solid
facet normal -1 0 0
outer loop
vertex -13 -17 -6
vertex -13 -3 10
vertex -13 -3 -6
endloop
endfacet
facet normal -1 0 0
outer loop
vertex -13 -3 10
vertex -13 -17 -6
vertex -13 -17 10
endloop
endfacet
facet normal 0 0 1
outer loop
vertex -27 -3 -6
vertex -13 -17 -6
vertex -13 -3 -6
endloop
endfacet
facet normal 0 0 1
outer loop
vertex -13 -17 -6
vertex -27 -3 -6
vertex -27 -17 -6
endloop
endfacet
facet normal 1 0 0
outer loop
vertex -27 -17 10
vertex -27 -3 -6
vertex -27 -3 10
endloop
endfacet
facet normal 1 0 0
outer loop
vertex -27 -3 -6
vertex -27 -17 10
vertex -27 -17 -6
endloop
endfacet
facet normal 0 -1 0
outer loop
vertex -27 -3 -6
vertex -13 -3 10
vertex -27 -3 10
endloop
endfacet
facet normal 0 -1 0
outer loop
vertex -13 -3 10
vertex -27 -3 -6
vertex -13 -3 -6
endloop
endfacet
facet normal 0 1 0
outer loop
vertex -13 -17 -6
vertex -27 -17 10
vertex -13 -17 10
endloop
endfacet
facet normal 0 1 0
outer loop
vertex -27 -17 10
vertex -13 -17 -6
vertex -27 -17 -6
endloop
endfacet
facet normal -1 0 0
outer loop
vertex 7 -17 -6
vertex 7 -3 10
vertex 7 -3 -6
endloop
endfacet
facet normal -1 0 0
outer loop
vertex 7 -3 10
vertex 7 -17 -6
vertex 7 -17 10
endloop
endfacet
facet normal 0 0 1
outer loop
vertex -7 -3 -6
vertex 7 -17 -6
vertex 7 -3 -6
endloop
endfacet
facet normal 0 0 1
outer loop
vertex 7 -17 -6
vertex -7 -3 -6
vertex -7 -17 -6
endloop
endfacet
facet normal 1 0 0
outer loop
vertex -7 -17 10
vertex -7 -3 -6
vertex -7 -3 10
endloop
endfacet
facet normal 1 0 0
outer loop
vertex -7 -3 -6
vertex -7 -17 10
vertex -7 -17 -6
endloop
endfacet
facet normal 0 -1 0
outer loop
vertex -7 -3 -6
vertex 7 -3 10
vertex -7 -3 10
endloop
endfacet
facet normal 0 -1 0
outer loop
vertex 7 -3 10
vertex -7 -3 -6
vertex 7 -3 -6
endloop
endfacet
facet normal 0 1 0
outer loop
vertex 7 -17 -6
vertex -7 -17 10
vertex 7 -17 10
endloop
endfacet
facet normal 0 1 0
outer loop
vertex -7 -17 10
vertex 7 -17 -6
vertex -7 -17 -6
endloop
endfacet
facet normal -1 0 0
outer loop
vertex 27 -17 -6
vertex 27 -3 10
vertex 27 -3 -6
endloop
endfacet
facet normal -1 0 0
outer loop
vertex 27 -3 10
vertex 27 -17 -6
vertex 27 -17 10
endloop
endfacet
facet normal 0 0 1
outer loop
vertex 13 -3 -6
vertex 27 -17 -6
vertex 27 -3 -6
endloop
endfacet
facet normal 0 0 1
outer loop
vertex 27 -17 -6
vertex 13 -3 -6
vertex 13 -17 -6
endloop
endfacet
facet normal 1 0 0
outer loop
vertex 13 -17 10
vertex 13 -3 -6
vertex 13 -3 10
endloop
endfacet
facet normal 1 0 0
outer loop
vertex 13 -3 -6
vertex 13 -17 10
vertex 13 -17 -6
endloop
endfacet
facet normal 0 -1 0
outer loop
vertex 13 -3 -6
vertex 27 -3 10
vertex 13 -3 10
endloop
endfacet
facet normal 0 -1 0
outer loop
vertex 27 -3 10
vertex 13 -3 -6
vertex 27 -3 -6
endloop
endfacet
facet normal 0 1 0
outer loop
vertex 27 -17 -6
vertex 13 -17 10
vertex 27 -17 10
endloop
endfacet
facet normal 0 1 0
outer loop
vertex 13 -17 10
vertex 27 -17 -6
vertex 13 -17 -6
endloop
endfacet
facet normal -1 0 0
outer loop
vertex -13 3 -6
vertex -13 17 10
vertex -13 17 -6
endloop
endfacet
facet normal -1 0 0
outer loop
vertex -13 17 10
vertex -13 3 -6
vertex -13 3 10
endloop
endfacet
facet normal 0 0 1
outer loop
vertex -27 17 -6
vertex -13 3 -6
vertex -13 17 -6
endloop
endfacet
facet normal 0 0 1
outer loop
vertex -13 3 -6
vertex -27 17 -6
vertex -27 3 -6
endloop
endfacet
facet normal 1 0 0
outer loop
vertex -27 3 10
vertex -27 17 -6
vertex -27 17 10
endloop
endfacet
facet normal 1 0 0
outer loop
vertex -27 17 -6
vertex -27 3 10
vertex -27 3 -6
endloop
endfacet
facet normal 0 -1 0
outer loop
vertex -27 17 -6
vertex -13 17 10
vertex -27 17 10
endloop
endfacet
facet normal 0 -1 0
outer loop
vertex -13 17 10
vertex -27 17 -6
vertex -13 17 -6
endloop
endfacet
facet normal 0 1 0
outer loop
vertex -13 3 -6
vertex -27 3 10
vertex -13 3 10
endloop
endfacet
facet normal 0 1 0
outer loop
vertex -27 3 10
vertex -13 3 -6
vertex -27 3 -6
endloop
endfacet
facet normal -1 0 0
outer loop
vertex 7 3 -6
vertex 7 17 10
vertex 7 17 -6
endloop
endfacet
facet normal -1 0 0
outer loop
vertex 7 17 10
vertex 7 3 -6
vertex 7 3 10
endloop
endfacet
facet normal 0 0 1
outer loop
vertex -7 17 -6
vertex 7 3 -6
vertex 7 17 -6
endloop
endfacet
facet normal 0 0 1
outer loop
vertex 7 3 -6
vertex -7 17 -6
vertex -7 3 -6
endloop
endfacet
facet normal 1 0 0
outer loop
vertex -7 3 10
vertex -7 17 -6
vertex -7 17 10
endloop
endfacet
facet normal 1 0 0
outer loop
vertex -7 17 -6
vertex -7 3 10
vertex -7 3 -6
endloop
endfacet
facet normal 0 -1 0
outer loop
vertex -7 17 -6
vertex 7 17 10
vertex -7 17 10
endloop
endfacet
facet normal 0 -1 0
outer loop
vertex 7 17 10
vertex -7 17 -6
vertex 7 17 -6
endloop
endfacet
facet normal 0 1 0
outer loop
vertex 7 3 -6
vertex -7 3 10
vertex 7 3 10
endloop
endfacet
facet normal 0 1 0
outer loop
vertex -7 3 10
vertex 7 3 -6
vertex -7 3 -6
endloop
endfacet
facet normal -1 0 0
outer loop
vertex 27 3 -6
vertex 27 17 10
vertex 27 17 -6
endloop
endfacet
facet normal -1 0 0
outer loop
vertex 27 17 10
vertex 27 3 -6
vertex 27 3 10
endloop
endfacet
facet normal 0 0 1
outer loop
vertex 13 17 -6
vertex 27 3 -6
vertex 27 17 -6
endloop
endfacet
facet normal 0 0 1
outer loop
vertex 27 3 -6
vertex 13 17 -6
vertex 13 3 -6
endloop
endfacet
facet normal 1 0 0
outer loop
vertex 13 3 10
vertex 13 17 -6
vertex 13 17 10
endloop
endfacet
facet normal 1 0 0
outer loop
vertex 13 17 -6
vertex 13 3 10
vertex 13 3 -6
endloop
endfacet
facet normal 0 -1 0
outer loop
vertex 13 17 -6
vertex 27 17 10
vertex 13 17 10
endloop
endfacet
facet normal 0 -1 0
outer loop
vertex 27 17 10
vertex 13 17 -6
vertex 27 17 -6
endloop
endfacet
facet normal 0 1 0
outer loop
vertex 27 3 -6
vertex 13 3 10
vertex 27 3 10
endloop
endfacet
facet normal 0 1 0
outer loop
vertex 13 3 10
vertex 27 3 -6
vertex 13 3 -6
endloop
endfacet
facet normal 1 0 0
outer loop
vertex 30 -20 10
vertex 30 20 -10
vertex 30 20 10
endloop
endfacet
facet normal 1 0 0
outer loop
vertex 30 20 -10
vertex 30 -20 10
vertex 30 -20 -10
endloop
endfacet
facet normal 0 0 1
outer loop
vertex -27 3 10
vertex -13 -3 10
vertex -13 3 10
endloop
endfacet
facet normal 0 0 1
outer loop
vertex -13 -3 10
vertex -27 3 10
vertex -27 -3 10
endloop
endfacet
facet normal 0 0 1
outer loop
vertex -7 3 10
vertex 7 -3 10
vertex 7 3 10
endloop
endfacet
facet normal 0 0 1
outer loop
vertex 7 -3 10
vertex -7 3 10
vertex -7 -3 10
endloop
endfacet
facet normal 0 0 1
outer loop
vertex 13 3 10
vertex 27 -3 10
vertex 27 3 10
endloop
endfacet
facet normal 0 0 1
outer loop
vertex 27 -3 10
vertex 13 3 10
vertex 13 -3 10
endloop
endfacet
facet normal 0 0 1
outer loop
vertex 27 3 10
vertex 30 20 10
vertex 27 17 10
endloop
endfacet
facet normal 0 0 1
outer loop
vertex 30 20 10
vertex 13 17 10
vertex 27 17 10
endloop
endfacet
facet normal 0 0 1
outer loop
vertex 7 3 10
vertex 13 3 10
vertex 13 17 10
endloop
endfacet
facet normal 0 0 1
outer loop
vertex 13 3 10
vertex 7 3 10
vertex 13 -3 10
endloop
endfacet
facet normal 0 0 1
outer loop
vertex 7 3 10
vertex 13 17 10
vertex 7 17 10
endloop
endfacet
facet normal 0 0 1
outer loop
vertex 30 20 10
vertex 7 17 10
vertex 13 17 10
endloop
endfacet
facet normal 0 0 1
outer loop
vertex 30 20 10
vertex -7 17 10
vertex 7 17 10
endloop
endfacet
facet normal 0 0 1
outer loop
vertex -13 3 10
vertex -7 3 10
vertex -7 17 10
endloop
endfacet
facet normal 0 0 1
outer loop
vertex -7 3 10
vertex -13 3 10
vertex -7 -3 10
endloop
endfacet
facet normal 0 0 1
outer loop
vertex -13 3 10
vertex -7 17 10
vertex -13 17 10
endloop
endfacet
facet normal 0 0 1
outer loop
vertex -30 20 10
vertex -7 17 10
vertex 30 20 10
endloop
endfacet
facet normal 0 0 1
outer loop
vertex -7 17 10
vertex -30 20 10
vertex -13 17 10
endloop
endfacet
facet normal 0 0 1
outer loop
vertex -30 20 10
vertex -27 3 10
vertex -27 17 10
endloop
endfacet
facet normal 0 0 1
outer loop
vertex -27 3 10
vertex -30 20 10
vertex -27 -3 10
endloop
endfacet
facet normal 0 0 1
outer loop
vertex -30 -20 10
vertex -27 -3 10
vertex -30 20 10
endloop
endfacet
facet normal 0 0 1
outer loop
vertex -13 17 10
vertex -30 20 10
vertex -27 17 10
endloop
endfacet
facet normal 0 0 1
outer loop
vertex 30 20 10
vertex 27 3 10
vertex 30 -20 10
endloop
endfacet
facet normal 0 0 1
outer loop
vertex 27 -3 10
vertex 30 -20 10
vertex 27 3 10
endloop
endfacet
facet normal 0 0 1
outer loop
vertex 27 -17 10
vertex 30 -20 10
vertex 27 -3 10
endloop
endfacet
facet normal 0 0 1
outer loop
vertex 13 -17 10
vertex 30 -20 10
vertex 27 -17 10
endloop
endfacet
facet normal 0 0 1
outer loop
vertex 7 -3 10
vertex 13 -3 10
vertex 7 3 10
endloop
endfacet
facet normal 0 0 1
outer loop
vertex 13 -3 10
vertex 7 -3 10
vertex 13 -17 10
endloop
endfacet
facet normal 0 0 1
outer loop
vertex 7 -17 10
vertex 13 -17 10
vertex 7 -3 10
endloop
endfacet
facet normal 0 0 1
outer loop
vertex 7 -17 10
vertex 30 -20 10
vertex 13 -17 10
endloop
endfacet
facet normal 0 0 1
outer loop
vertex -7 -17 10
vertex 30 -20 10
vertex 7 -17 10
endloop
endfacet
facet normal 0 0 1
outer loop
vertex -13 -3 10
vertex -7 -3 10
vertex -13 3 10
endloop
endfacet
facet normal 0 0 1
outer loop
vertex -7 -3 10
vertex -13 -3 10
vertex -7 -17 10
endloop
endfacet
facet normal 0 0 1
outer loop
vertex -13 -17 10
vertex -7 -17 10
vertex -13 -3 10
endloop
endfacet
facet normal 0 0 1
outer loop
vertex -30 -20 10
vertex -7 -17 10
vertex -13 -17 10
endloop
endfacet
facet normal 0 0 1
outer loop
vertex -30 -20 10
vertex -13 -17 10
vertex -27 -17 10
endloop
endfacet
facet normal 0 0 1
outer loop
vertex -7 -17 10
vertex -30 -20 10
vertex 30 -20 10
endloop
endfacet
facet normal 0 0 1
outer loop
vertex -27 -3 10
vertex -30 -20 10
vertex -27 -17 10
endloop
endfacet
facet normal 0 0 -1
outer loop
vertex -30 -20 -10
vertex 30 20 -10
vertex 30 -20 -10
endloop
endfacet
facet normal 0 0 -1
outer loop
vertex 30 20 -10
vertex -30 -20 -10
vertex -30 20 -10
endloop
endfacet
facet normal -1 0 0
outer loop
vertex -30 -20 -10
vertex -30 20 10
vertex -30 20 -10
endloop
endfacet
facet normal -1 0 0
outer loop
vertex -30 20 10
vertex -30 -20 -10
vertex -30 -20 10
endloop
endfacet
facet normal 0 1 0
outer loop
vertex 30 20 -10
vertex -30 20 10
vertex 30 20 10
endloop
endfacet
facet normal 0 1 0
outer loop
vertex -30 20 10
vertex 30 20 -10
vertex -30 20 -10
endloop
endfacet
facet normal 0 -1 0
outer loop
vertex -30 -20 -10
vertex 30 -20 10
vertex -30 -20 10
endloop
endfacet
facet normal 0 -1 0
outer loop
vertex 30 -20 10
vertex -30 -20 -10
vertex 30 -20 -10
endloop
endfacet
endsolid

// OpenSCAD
$fn = 32;

// ----------------------------------------------------------------------
// Pocket plate 60 x 40 x 20
// 2 x 3 pockets 14 mm square, 16 mm deep
// ----------------------------------------------------------------------

// --- parameters (mm) ---
thickness = 20;  // plate thickness
floor_t = 4;     // material left under each pocket
pocket = 14;     // pocket side length
pitch_x = 20;    // pocket pitch along X
pitch_y = 20;    // pocket pitch along Y
cols = 3;        // pockets per row
rows = 2;        // rows of pockets

// --- derived feature positions (mm) ---
depth = thickness - floor_t;        // = 16   pocket depth, down to the floor
span_x = (cols - 1) * pitch_x;      // = 40   distance between outer pockets
span_y = (rows - 1) * pitch_y;      // = 20   distance between outer pocket rows
origin_x = -span_x / 2;             // = -20   X of the first pocket
origin_y = -span_y / 2;             // = -10   Y of the first pocket
plate = [span_x + pocket + 6, span_y + pocket + 6, thickness];  // = [60, 40, 20]   overall size: pockets plus 3 mm of wall on each side
feature_centers = [
  [origin_x + 0 * pitch_x, origin_y + 0 * pitch_y],
  [origin_x + 1 * pitch_x, origin_y + 0 * pitch_y],
  [origin_x + 2 * pitch_x, origin_y + 0 * pitch_y],
  [origin_x + 0 * pitch_x, origin_y + 1 * pitch_y],
  [origin_x + 1 * pitch_x, origin_y + 1 * pitch_y],
  [origin_x + 2 * pitch_x, origin_y + 1 * pitch_y]
];   // pocket centres, used verbatim by the cutter loop

// plate outline, then one pocket per centre in feature_centers
difference() {
  cube(plate, center = true);
  for (centre = feature_centers)
    translate([centre[0] - pocket / 2, centre[1] - pocket / 2, plate[2] / 2 - depth])
      cube([pocket, pocket, depth + 1]);  // centred on the declared pocket centre
}
